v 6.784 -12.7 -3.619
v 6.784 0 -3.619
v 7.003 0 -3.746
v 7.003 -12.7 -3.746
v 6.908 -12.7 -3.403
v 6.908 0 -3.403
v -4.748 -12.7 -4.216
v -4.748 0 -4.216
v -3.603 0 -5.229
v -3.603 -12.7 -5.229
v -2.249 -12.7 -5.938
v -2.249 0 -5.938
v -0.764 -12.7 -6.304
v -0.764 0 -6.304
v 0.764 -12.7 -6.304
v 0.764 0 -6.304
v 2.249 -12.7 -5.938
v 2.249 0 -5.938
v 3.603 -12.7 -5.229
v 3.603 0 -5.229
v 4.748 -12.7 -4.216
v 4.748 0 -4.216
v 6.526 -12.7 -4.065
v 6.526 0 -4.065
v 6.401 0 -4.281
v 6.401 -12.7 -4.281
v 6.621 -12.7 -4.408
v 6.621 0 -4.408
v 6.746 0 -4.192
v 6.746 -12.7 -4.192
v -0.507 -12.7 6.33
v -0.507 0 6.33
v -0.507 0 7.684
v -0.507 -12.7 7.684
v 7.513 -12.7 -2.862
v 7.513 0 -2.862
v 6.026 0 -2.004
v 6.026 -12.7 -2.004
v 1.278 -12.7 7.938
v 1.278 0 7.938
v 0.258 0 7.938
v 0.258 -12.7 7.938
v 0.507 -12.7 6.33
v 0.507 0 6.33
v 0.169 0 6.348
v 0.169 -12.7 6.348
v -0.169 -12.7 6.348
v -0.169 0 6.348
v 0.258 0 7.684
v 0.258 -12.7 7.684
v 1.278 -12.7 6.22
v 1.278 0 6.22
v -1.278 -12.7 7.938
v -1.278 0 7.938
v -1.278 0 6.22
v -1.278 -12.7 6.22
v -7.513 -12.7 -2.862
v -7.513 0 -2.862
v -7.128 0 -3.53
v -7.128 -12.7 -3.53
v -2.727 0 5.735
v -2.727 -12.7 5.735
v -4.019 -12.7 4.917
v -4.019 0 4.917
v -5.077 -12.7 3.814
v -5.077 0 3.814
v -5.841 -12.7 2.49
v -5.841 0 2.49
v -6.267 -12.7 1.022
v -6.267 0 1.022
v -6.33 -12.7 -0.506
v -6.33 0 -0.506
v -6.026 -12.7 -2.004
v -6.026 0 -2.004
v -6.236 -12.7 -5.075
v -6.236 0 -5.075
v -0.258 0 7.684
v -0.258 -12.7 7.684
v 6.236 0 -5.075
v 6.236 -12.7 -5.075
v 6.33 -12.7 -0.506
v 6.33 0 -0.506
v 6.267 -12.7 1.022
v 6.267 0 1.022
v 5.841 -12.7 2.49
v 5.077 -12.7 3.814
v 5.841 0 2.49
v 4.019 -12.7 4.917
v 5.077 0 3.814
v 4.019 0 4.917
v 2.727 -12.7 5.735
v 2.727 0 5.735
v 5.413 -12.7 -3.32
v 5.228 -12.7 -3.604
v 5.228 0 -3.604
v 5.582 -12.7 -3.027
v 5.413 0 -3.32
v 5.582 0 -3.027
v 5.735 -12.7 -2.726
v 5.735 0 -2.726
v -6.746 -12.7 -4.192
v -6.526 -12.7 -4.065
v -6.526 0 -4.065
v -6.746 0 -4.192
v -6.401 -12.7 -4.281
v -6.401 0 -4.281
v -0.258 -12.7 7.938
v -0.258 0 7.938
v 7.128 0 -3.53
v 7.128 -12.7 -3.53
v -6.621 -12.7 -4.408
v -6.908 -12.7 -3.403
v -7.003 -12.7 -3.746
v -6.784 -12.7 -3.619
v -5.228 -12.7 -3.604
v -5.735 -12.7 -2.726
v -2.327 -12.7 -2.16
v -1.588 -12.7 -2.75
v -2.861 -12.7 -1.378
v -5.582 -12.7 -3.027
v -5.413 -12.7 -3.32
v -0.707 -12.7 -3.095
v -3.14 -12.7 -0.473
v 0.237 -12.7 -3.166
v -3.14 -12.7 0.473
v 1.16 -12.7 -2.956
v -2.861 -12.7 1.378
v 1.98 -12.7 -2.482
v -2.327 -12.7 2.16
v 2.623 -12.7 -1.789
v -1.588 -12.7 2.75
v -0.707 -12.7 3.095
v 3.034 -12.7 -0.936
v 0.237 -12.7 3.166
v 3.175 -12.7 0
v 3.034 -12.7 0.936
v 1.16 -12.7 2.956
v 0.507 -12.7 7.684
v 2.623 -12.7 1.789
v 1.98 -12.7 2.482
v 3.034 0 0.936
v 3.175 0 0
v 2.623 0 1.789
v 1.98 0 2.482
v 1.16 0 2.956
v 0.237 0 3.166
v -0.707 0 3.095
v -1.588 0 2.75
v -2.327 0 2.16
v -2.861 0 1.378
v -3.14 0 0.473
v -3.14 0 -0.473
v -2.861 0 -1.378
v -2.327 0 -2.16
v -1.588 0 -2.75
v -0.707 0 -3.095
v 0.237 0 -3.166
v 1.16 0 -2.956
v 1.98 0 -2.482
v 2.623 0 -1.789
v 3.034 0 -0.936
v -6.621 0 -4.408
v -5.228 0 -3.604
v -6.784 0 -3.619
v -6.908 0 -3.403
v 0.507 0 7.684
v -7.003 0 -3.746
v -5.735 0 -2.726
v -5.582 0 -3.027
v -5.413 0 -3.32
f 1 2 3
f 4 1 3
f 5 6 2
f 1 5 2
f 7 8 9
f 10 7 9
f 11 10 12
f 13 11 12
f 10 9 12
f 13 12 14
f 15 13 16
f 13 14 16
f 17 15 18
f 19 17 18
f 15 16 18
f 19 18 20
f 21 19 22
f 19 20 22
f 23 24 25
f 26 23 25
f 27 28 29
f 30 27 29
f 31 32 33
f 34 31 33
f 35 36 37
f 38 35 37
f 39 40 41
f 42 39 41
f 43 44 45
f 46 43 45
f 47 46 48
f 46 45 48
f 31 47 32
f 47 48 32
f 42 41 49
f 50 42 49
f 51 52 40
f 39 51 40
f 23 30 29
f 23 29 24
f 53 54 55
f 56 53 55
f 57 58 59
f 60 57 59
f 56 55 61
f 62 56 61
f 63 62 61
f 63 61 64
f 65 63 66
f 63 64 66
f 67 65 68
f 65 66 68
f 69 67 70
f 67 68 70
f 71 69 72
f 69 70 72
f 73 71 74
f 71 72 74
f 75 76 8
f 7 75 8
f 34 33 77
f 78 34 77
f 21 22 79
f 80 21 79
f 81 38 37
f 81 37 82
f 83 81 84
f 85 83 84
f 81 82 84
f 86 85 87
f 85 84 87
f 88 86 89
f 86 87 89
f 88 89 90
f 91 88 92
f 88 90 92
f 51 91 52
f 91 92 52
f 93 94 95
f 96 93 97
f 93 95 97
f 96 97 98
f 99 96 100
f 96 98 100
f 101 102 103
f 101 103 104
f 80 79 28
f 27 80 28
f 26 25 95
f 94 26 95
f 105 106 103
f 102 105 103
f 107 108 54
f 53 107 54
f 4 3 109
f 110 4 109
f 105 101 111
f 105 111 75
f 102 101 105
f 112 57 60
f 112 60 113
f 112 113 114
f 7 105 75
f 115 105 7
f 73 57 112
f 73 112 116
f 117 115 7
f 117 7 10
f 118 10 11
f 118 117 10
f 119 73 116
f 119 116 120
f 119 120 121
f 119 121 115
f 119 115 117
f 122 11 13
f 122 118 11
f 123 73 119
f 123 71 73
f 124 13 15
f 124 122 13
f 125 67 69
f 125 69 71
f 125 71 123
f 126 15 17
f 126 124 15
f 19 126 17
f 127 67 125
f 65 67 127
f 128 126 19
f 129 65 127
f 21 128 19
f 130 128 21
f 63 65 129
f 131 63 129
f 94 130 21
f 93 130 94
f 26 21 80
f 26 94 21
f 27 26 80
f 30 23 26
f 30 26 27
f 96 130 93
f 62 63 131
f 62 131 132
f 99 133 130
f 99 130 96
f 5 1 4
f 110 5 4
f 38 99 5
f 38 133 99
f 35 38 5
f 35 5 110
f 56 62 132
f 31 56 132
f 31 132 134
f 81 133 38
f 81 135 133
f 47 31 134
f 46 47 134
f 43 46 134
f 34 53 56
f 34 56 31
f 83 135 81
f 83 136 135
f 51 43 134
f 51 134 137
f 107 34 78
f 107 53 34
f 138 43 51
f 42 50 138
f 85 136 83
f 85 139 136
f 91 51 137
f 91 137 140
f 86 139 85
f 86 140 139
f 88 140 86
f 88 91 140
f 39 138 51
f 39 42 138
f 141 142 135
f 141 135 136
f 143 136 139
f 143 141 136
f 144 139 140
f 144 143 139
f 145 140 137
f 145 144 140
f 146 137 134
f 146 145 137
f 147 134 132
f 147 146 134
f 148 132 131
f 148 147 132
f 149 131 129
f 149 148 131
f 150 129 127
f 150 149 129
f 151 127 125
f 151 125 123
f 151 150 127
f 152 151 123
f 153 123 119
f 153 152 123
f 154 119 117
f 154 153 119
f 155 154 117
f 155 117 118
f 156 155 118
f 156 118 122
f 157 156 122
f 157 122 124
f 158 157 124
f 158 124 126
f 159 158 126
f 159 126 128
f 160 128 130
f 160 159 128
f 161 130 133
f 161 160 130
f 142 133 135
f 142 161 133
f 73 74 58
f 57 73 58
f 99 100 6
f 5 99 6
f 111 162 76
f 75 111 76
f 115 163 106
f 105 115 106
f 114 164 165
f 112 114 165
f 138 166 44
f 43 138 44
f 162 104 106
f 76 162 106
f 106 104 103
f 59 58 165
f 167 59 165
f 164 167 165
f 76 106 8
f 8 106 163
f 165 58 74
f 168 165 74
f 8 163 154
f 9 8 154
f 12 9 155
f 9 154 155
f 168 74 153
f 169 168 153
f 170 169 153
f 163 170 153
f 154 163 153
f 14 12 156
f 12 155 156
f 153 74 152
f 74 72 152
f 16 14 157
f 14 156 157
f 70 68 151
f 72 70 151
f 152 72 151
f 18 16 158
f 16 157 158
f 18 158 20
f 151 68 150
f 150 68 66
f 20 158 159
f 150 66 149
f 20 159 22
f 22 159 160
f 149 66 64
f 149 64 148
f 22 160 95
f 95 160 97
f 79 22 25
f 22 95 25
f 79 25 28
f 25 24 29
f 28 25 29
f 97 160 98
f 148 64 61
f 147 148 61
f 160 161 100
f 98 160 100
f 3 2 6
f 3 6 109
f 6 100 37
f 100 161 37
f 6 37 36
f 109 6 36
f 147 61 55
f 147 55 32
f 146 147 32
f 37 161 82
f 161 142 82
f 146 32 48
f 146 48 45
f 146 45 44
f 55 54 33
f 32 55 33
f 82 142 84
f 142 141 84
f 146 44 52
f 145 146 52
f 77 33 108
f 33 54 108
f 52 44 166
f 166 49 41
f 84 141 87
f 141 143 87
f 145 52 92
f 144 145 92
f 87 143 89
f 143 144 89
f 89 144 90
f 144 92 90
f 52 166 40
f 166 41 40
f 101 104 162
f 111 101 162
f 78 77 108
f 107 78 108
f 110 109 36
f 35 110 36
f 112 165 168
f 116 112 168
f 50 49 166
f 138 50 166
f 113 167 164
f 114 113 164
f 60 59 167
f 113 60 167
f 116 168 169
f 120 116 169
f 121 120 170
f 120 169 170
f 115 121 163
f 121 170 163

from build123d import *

# Parameters (mm, degrees)
F0_R     = 3.175
F1_DEPTH = 12.7


with BuildPart() as f1:
    # F0 (on Front) → F1 (new body)
    with BuildSketch(Plane.XZ):
        with BuildLine():
            Line((0.507003, 7.684488), (0.507003, 6.329727))
            ThreePointArc((0.507003, 6.329727), (0, 6.35), (-0.507003, 6.329727))
            Line((-0.507003, 6.329727), (-0.507003, 7.684488))
            Line((-0.507003, 7.684488), (-0.257541, 7.684488))
            Line((-0.257541, 7.684488), (-0.257541, 7.937779))
            Line((-0.257541, 7.937779), (-0.507003, 7.937779))
            Line((-0.507003, 7.937779), (-1.277548, 7.937779))
            Line((-1.277548, 7.937779), (-1.277548, 6.220158))
            ThreePointArc((-1.277548, 6.220158), (-5.499261, 3.175), (-6.025589, -2.00369))
            Line((-6.025589, -2.00369), (-7.513093, -2.8625))
            Line((-7.513093, -2.8625), (-7.12782, -3.529812))
            Line((-7.12782, -3.529812), (-7.003089, -3.745852))
            Line((-7.003089, -3.745852), (-6.783733, -3.619207))
            Line((-6.783733, -3.619207), (-6.908463, -3.403167))
            Line((-6.908463, -3.403167), (-5.735206, -2.725786))
            ThreePointArc((-5.735206, -2.725786), (-5.499261, -3.175), (-5.228203, -3.603941))
            Line((-5.228203, -3.603941), (-6.401461, -4.281321))
            Line((-6.401461, -4.281321), (-6.526191, -4.065281))
            Line((-6.526191, -4.065281), (-6.745548, -4.191927))
            Line((-6.745548, -4.191927), (-6.620817, -4.407967))
            Line((-6.620817, -4.407967), (-6.235544, -5.075279))
            Line((-6.235544, -5.075279), (-4.748041, -4.216469))
            ThreePointArc((-4.748041, -4.216469), (0, -6.35), (4.748041, -4.216469))
            Line((4.748041, -4.216469), (6.235544, -5.075279))
            Line((6.235544, -5.075279), (6.620817, -4.407967))
            Line((6.620817, -4.407967), (6.745548, -4.191927))
            Line((6.745548, -4.191927), (6.526191, -4.065281))
            Line((6.526191, -4.065281), (6.401461, -4.281321))
            Line((6.401461, -4.281321), (5.228203, -3.603941))
            ThreePointArc((5.228203, -3.603941), (5.499261, -3.175), (5.735206, -2.725786))
            Line((5.735206, -2.725786), (6.908463, -3.403167))
            Line((6.908463, -3.403167), (6.783733, -3.619207))
            Line((6.783733, -3.619207), (7.003089, -3.745852))
            Line((7.003089, -3.745852), (7.12782, -3.529812))
            Line((7.12782, -3.529812), (7.513093, -2.8625))
            Line((7.513093, -2.8625), (6.025589, -2.00369))
            ThreePointArc((6.025589, -2.00369), (5.499261, 3.175), (1.277548, 6.220158))
            Line((1.277548, 6.220158), (1.277548, 7.937779))
            Line((1.277548, 7.937779), (0.507003, 7.937779))
            Line((0.507003, 7.937779), (0.257541, 7.937779))
            Line((0.257541, 7.937779), (0.257541, 7.684488))
            Line((0.257541, 7.684488), (0.507003, 7.684488))
        make_face()
        Circle(F0_R, mode=Mode.SUBTRACT)
    extrude(amount=F1_DEPTH)


solid = f1.part
